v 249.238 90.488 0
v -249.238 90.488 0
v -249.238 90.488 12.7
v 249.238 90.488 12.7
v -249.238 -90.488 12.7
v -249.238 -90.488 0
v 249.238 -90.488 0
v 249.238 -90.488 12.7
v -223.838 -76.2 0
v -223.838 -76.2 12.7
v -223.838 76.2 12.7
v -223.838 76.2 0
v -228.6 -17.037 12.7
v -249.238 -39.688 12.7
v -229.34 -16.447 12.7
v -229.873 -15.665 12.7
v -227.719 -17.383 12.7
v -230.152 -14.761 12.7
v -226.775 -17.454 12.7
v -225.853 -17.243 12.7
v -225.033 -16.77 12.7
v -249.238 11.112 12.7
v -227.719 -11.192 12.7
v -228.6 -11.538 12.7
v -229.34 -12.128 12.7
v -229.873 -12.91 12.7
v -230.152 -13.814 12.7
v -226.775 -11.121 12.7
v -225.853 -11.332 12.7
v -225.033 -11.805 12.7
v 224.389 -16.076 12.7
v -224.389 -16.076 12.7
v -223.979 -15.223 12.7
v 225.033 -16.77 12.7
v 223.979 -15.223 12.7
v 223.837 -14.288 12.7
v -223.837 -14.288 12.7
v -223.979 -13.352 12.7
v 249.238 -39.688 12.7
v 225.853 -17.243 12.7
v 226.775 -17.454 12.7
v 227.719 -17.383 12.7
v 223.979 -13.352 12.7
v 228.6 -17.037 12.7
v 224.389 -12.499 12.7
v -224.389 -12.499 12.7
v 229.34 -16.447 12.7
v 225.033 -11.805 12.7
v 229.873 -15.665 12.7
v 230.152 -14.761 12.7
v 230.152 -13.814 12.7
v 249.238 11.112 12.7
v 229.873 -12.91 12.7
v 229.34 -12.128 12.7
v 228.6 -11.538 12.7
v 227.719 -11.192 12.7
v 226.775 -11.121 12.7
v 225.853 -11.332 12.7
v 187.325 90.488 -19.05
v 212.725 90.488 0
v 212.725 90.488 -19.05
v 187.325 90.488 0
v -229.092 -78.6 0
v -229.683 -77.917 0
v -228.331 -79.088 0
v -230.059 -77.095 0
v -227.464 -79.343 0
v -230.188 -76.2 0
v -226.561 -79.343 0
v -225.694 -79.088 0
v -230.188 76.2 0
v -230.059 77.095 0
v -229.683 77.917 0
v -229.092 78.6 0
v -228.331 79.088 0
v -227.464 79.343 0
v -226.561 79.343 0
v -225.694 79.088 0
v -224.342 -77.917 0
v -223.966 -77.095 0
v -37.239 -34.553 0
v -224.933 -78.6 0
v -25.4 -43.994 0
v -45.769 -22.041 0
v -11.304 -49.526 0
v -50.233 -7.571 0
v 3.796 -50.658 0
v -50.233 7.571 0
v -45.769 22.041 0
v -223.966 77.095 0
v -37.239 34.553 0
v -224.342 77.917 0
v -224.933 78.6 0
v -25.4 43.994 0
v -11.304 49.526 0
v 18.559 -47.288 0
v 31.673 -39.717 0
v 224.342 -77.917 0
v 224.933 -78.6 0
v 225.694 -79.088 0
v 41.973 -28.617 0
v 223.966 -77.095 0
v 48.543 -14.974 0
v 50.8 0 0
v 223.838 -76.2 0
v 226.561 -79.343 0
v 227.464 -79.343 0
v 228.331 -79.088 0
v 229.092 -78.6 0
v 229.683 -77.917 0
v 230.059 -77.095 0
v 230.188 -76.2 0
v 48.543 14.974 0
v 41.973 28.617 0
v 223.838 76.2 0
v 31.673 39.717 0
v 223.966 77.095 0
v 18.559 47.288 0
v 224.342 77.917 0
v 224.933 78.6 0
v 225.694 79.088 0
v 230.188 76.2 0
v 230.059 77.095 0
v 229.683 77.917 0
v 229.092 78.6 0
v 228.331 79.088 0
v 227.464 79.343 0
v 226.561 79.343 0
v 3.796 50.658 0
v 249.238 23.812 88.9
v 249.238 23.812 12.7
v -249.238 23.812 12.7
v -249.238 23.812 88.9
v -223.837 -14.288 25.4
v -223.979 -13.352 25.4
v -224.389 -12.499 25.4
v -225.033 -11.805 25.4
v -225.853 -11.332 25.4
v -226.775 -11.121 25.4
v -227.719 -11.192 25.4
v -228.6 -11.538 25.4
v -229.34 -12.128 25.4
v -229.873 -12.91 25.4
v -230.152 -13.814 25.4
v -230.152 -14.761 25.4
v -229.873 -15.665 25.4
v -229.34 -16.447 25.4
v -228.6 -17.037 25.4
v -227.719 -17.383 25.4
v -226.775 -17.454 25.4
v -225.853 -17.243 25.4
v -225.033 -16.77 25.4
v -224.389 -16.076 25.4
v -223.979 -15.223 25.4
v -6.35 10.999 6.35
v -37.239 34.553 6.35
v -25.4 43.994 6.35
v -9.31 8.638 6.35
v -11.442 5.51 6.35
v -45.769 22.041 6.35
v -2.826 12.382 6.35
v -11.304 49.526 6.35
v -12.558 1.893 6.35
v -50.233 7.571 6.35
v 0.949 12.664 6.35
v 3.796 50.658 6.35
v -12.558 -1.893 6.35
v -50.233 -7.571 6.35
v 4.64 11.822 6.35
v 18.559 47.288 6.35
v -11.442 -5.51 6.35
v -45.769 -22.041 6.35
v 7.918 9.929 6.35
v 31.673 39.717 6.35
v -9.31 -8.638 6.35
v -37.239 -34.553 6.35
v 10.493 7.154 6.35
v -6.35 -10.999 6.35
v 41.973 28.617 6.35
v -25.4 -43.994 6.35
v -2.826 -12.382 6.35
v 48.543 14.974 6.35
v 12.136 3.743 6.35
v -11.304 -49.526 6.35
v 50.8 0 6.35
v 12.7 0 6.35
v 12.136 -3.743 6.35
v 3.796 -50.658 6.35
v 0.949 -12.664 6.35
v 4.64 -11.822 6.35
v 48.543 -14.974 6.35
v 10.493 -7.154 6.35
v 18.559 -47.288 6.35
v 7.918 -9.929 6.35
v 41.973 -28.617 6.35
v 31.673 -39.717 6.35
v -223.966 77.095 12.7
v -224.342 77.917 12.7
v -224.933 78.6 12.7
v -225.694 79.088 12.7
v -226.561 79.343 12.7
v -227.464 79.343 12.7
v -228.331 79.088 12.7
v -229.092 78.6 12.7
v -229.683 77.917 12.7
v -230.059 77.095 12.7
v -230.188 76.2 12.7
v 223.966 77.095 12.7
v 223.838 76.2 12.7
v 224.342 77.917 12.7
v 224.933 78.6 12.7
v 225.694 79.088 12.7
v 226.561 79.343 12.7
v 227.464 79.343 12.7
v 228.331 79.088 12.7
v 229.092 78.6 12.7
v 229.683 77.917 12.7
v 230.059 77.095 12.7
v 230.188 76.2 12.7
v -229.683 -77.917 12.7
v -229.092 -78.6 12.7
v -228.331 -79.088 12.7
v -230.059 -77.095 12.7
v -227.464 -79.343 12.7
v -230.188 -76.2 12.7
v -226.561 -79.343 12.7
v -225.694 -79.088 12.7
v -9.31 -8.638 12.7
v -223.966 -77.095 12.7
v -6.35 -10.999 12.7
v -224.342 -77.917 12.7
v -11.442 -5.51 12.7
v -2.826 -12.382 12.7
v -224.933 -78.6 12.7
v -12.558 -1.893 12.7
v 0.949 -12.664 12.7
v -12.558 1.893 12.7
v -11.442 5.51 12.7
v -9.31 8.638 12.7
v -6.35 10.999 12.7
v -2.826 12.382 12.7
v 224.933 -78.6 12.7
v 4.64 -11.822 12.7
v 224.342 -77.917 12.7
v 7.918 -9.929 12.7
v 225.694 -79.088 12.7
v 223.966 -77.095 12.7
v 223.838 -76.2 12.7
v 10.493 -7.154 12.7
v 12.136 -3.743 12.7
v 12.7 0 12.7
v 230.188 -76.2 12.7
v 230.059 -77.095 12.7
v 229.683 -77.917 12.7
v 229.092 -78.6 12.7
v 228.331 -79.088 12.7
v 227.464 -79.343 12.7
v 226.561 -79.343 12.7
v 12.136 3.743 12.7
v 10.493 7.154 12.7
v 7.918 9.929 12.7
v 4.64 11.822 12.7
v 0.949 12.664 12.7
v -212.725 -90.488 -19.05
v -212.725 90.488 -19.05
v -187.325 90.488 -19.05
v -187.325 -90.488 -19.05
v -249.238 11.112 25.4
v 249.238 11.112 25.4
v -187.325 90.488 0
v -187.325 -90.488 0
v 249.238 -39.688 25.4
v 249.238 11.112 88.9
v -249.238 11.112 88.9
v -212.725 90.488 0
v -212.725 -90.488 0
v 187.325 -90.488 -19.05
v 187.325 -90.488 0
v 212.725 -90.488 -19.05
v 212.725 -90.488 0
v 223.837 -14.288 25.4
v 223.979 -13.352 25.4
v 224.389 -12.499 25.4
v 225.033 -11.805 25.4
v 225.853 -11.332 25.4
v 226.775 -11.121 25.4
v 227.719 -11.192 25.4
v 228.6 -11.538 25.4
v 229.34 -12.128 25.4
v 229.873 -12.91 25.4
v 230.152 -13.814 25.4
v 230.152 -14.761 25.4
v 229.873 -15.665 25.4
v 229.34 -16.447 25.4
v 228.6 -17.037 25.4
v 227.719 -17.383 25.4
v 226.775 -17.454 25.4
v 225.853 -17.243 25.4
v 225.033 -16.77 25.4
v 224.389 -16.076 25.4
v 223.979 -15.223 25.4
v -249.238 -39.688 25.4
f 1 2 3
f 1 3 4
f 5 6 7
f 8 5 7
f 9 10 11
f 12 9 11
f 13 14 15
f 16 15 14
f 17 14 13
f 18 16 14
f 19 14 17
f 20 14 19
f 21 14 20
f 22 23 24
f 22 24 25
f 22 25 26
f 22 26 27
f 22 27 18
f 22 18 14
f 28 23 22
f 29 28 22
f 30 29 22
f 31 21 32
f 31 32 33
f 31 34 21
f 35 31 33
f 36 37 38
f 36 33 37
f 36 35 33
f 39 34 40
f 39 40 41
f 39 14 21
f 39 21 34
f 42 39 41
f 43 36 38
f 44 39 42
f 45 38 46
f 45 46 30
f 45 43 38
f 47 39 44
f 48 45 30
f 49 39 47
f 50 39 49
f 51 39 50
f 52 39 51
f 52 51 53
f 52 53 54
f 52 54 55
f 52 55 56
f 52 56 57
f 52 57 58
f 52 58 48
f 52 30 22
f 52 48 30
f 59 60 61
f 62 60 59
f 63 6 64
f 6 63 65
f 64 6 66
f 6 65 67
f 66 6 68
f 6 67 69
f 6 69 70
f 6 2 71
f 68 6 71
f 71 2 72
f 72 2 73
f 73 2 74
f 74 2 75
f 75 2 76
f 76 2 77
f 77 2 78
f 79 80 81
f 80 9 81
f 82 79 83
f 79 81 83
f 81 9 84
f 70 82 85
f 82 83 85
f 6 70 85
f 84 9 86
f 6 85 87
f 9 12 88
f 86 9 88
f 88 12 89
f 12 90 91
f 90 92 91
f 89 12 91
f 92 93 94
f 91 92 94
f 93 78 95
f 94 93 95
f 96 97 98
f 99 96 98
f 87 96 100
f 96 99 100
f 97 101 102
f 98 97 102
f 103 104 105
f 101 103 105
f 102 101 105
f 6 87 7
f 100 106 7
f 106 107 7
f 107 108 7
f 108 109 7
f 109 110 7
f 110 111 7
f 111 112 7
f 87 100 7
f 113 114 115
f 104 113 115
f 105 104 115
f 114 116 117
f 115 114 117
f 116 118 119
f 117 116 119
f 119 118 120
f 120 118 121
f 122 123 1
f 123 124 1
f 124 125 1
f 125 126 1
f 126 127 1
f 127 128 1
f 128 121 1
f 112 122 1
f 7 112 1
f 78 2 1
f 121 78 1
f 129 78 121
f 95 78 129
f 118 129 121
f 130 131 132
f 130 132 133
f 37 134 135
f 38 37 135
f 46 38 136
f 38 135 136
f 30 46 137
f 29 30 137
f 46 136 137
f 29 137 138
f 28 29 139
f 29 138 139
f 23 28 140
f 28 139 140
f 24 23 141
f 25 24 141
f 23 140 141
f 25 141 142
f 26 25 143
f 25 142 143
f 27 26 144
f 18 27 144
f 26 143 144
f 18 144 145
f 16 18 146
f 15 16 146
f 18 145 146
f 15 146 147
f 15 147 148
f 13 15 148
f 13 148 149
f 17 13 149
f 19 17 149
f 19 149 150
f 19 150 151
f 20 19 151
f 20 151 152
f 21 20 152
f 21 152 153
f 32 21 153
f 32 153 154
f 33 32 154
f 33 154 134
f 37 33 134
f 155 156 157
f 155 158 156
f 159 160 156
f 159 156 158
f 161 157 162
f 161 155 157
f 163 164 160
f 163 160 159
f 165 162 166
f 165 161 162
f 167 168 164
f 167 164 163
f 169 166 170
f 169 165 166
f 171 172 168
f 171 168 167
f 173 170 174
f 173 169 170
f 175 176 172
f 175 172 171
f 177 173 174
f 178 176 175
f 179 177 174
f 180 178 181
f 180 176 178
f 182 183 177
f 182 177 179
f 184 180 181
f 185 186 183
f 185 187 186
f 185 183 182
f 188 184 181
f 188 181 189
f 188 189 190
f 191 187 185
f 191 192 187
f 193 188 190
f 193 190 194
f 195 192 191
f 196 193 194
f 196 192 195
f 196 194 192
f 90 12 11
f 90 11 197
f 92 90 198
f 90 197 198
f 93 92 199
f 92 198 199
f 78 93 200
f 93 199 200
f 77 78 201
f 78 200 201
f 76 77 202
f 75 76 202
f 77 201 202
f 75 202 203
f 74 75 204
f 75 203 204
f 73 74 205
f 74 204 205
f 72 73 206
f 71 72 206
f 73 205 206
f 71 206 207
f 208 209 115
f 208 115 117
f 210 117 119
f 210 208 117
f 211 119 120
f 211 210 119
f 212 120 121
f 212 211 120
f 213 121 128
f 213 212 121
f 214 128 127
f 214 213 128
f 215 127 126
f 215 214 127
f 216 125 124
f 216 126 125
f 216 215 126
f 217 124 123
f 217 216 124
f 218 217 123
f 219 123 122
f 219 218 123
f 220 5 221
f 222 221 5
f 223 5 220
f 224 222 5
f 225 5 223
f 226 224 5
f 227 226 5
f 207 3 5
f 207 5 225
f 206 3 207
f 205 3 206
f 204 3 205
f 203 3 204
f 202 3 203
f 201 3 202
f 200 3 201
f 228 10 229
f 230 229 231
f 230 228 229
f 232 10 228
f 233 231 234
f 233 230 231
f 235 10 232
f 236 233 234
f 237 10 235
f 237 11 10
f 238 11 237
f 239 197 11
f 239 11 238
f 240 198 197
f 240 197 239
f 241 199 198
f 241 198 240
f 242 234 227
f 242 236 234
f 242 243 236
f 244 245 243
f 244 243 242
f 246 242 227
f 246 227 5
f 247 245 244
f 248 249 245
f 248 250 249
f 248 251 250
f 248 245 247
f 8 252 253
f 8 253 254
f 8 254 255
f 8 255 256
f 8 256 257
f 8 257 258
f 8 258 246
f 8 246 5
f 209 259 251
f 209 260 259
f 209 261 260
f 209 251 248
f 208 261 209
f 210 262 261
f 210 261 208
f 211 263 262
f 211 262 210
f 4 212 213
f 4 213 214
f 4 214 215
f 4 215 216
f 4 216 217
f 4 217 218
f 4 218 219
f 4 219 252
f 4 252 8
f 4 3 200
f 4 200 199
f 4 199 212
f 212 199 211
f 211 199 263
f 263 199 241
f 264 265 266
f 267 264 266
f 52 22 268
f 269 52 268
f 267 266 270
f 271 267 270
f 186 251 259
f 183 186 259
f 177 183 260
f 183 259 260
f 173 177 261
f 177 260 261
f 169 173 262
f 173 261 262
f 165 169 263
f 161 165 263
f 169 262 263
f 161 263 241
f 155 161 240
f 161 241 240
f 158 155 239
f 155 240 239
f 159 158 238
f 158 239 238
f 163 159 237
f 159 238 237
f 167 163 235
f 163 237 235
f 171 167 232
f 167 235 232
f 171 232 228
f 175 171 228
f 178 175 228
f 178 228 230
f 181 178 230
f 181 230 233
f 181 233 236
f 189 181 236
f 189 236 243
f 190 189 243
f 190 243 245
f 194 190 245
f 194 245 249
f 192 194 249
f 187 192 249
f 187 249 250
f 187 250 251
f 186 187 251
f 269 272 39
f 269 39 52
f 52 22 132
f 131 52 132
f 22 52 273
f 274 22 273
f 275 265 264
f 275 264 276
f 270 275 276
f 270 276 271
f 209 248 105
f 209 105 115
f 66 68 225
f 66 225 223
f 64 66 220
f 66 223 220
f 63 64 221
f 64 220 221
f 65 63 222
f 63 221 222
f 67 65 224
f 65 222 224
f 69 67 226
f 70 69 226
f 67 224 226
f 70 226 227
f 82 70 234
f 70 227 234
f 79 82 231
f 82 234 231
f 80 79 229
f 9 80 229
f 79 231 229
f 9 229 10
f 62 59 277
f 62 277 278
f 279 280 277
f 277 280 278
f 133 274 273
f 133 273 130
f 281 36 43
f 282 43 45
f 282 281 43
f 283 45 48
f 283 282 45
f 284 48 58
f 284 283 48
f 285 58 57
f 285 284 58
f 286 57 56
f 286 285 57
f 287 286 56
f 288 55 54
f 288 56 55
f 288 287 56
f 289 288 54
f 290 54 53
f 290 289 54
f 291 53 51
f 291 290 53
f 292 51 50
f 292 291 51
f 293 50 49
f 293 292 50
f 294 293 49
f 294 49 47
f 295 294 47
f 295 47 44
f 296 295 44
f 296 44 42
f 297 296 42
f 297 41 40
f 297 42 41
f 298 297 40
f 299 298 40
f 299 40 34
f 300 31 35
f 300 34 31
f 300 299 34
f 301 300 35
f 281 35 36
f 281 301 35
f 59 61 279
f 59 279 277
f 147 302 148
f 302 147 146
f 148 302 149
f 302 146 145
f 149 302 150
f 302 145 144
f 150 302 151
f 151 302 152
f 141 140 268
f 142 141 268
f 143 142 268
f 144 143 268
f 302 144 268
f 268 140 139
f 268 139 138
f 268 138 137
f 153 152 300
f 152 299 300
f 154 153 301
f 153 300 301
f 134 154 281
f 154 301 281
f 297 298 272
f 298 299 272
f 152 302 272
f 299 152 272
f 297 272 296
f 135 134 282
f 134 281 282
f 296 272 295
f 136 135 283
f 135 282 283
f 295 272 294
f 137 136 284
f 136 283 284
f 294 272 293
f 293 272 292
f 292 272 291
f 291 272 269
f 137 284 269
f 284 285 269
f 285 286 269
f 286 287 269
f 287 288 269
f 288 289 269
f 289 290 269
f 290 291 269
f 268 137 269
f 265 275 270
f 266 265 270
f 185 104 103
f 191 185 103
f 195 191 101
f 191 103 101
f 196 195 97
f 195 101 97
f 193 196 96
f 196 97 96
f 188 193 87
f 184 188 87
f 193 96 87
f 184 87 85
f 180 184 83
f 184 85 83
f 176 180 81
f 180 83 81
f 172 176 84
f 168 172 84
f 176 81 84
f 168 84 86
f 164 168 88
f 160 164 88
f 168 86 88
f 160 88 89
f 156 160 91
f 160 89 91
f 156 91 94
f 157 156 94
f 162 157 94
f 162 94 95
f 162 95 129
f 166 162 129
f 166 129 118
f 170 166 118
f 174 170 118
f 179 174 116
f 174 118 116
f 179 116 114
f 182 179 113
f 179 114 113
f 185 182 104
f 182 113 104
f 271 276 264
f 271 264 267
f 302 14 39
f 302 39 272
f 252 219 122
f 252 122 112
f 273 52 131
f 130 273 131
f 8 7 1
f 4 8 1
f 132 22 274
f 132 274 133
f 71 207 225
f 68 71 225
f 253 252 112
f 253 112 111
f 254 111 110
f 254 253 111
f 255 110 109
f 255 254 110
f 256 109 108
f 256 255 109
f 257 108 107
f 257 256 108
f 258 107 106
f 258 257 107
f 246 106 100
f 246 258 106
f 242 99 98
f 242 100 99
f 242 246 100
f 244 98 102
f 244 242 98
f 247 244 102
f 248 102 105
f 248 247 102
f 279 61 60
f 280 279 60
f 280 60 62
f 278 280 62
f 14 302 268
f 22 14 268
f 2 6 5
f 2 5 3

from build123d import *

# Parameters (mm, degrees)
F0_W      = 498.475
F0_H      = 180.975
F1_DEPTH  = 12.7
F2_W      = 25.4
F2_H      = 19.05
F3_DEPTH  = 180.975
F5_R      = 12.7
F6_DEPTH  = 25.4
F7_R      = 50.8
F8_DEPTH  = 6.35
F10_DEPTH = 25.4
F11_W     = 50.8
F11_H     = 12.7
F12_DEPTH = 249.2375
F13_R     = 3.175
F14_DEPTH = 25.4
F15_W     = 12.7
F15_H     = 76.2
F16_DEPTH = 249.2375


# Not quite as in the source:
# - a pattern or mirror of a feature is missing from the dataset's text; its kind, count and spacing are read off the source's solid


with BuildPart() as f1:
    # F0 (on Top) → F1 (new body)
    with BuildSketch(Plane.XY):
        Rectangle(F0_W, F0_H)
    extrude(amount=F1_DEPTH)

    # F5 (on face) → F6 (cut)
    with BuildSketch(Plane.XY.offset(12.7)):
        Circle(F5_R)
    extrude(amount=-F6_DEPTH, mode=Mode.SUBTRACT)

    # F7 (on face) → F8 (cut)
    with BuildSketch(Plane(origin=(0, 0, 0), x_dir=(1, 0, 0), z_dir=(0, 0, -1))):
        Circle(F7_R)
    extrude(amount=-F8_DEPTH, mode=Mode.SUBTRACT)

    # F9 (on face) → F10 (cut)
    with BuildSketch(Plane.XY.offset(12.7)):
        with BuildLine():
            Line((-230.1875, 76.2), (-230.1875, -76.2))
            ThreePointArc((-230.1875, -76.2), (-227.0125, -79.375), (-223.8375, -76.2))
            Line((-223.8375, -76.2), (-223.8375, 76.2))
            ThreePointArc((-223.8375, 76.2), (-227.0125, 79.375), (-230.1875, 76.2))
        make_face()
    f10 = extrude(amount=-F10_DEPTH, mode=Mode.SUBTRACT)

    # F10_copies: F10 across plane
    add(f10.mirror(Plane(origin=(0, 0, 0), x_dir=(0, 0, 1), z_dir=(1, 0, 0))), mode=Mode.SUBTRACT)


with BuildPart() as f3:
    # F2 (on face) → F3 (new body, through all)
    with BuildSketch(Plane.XZ.offset(90.4875)):
        with Locations((-200.025, -9.525)):
            Rectangle(F2_W, F2_H)
    extrude(amount=-F3_DEPTH)


with BuildPart() as f4_1:
    # F4: instance of F3
    add(f3.part.mirror(Plane.YZ))


with BuildPart() as f12:
    # F11 (on Right) → F12 (new body, symmetric)
    with BuildSketch(Plane.YZ):
        with Locations((-14.2875, 19.05)):
            Rectangle(F11_W, F11_H)
    extrude(amount=F12_DEPTH, both=True)

    # F13 (on face) → F14 (cut)
    with BuildSketch(Plane.XY.offset(25.4)):
        with Locations((-227.0125, -14.2875)):
            Circle(F13_R)
    f14 = extrude(amount=-F14_DEPTH, mode=Mode.SUBTRACT)

    # F14_copies: F14 across plane
    add(f14.mirror(Plane(origin=(0, 0, 0), x_dir=(0, 0, 1), z_dir=(1, 0, 0))), mode=Mode.SUBTRACT)


with BuildPart() as f16:
    # F15 (on Right) → F16 (new body, symmetric)
    with BuildSketch(Plane.YZ):
        with Locations((17.4625, 50.8)):
            Rectangle(F15_W, F15_H)
    extrude(amount=F16_DEPTH, both=True)


solid = Compound([f1.part, f3.part, f4_1.part, f12.part, f16.part])
